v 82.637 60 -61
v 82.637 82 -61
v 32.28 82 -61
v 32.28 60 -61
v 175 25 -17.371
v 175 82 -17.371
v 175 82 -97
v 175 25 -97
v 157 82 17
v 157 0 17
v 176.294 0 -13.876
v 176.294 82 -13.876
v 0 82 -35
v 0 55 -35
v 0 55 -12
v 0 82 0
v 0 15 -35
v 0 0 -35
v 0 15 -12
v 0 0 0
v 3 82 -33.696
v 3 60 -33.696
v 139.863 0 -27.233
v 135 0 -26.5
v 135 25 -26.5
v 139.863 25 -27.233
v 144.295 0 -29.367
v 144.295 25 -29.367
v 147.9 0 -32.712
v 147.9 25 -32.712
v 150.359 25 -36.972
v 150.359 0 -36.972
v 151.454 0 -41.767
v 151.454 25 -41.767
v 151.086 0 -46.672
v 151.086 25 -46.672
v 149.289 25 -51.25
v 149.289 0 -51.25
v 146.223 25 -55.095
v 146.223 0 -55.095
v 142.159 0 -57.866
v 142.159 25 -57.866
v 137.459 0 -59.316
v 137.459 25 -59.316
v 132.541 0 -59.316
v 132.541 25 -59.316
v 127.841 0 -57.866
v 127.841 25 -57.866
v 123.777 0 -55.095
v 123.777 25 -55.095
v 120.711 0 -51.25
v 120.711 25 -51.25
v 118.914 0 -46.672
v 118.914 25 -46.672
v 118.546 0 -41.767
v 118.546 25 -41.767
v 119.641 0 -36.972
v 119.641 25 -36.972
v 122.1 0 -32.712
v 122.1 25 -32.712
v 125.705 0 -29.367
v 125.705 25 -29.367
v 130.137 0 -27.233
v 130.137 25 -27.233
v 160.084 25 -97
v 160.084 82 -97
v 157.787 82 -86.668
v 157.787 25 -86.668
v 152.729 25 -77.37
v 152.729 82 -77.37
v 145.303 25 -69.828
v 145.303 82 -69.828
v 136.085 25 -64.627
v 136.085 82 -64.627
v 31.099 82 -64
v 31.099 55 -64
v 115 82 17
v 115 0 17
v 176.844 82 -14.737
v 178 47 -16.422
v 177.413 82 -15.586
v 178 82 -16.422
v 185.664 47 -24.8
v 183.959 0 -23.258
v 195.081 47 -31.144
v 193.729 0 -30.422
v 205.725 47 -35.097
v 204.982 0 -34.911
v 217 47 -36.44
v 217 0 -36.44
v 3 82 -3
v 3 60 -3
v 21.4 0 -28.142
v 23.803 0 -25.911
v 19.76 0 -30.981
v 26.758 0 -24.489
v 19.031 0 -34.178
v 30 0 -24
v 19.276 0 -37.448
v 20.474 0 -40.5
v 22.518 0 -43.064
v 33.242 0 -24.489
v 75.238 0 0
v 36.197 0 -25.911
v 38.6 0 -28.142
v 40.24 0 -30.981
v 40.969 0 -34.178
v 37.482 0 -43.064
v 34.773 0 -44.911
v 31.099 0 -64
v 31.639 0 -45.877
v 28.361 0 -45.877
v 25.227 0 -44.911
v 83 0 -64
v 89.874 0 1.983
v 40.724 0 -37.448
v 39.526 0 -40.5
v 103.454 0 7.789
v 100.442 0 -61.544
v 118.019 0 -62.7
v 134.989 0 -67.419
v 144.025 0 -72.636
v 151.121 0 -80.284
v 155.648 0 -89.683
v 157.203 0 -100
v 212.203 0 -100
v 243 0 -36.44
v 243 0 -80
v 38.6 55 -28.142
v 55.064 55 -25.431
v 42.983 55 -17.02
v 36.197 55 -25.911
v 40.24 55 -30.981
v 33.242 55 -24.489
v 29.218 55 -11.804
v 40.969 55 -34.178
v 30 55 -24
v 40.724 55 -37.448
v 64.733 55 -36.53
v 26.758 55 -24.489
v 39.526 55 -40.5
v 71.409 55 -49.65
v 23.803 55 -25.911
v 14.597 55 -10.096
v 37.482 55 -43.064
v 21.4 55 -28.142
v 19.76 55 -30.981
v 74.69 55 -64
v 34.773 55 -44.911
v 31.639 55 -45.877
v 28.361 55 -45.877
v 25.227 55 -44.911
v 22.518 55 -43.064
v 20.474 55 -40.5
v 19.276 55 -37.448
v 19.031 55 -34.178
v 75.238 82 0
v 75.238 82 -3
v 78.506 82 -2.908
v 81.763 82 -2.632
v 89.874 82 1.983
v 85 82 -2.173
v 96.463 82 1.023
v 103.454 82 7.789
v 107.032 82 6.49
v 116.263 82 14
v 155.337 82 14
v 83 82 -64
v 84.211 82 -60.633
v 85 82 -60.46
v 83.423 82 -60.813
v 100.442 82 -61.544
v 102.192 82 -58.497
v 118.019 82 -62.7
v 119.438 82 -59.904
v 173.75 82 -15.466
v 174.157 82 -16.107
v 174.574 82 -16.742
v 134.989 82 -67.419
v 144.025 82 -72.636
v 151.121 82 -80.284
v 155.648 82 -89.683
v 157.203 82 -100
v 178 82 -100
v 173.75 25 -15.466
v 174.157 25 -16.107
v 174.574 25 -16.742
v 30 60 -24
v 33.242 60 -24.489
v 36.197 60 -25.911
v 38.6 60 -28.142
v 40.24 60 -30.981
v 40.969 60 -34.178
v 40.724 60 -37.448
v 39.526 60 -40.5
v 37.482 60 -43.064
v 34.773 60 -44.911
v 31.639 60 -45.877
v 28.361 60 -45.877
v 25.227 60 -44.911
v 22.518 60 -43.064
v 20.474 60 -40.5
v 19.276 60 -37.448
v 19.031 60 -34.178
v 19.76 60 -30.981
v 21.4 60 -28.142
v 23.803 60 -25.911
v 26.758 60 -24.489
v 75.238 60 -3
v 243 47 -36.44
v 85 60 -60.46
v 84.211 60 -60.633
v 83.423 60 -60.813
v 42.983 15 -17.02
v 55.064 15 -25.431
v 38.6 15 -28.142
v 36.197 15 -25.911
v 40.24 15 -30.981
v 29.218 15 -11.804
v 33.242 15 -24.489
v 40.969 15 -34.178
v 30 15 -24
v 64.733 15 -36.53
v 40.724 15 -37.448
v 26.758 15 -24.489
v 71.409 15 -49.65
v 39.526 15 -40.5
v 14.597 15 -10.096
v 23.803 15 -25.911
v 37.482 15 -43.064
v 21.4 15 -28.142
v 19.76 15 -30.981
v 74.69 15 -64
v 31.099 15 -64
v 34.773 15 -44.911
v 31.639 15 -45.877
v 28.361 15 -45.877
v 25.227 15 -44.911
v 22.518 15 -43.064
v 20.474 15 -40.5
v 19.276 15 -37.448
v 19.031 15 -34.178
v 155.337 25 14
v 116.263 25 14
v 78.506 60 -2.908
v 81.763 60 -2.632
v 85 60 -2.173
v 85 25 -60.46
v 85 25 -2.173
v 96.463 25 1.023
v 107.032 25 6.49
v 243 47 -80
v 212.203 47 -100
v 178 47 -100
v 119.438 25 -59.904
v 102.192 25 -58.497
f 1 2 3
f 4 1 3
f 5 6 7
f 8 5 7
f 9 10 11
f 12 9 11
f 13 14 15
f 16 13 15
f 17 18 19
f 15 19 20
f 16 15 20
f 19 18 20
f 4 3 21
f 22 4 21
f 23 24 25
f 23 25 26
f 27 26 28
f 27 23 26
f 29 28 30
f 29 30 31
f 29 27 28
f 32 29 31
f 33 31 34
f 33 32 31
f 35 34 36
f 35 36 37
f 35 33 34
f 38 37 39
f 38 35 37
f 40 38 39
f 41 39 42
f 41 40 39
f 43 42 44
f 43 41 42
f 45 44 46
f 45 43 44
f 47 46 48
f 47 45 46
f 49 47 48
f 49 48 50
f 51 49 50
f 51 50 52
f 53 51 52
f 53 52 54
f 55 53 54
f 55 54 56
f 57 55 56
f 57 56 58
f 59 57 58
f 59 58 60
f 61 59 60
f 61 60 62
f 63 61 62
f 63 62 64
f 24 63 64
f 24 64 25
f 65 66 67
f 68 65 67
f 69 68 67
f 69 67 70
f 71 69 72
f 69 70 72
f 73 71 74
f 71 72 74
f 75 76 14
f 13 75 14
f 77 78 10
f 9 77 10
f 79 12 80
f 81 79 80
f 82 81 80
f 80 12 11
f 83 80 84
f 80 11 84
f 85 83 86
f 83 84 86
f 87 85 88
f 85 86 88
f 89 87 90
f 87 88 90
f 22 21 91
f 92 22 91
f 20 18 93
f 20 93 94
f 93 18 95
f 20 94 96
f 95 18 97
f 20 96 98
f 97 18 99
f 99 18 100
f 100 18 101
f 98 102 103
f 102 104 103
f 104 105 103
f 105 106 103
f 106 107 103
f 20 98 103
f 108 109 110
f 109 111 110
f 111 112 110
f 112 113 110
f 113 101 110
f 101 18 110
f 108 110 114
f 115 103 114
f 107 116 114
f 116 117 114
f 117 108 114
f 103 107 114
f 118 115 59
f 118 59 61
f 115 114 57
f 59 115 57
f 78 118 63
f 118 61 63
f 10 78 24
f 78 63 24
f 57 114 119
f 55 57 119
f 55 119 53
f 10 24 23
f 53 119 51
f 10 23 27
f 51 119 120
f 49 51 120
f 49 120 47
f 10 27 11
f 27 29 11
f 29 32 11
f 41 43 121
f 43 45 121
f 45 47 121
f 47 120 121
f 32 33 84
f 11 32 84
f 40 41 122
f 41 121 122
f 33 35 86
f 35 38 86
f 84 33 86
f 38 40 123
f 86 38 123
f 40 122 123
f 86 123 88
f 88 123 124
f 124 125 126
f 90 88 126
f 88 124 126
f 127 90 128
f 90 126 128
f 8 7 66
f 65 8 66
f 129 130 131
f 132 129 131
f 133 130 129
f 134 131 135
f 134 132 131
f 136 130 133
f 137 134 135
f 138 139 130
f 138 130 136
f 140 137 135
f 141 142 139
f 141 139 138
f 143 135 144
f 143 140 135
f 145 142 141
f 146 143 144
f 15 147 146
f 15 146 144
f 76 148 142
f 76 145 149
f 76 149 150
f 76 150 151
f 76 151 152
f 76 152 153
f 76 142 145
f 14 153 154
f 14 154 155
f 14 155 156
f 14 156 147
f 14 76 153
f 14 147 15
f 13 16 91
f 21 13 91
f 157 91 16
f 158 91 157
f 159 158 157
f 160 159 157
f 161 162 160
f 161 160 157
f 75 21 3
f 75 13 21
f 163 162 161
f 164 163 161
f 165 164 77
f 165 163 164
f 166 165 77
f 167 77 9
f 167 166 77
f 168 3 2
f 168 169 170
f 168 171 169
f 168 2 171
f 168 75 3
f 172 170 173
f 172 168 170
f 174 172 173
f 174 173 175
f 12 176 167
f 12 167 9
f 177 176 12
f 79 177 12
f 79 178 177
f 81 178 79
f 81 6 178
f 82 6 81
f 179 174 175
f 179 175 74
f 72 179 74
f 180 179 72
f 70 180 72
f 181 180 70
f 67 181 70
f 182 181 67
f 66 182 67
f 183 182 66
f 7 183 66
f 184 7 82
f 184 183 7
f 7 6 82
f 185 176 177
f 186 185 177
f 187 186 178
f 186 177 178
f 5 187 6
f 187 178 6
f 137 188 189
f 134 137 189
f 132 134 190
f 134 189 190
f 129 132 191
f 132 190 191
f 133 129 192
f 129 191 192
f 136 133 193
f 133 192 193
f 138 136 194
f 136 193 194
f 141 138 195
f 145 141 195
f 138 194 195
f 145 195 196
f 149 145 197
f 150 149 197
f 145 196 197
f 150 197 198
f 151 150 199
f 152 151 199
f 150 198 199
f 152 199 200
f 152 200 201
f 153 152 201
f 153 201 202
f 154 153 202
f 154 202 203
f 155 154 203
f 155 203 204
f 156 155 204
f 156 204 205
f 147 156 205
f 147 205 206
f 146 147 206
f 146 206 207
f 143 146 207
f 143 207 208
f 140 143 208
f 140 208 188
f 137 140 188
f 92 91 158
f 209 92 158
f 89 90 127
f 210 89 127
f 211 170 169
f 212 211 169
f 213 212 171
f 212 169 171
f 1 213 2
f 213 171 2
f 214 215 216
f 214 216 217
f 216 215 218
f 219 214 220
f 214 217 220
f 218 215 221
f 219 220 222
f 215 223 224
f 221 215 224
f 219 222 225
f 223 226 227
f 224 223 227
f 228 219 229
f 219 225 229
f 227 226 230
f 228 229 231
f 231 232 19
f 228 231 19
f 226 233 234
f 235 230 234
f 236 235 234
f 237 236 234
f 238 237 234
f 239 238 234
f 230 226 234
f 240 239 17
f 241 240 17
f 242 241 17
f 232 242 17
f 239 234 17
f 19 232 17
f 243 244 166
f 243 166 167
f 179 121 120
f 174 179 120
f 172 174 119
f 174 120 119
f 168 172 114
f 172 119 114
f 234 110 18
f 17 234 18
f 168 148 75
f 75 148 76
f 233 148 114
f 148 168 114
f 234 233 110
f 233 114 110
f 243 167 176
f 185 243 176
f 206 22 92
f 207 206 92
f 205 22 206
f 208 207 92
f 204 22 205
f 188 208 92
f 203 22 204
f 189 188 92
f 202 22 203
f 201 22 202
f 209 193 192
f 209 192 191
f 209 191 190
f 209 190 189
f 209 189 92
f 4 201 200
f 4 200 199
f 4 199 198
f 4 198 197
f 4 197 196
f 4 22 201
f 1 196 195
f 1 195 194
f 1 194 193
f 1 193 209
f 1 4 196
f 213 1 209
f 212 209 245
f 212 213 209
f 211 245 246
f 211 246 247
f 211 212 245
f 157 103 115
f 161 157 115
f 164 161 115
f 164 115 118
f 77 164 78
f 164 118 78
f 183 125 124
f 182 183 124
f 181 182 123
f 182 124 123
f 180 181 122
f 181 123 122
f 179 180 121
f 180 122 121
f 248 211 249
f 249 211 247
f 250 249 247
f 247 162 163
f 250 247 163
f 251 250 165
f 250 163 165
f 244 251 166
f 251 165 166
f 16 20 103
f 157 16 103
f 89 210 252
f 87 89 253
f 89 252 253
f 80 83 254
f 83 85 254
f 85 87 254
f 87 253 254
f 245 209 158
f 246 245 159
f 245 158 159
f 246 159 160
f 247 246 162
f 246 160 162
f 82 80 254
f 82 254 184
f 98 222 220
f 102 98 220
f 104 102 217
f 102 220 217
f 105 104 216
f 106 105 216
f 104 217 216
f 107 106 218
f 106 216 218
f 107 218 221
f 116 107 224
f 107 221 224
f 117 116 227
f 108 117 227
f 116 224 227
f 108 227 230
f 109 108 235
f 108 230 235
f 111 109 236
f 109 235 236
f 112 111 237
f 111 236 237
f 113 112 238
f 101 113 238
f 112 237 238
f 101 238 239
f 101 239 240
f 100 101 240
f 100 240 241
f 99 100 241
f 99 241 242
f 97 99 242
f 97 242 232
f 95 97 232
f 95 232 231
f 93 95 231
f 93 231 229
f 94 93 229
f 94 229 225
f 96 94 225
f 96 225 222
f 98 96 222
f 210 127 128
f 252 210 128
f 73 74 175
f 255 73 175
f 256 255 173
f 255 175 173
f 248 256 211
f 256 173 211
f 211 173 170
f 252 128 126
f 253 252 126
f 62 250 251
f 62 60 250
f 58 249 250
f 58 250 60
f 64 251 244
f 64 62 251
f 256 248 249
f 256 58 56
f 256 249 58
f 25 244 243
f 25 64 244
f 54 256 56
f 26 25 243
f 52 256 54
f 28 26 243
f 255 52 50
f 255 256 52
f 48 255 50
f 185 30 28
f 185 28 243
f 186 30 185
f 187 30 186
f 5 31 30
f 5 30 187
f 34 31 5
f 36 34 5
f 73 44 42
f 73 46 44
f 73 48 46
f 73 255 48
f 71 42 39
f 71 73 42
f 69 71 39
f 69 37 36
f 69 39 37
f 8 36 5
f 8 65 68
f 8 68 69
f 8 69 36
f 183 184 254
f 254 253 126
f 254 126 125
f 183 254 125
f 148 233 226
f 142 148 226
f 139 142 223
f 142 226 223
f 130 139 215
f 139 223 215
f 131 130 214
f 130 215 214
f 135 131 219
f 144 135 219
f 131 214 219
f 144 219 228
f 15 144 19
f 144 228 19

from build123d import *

# Parameters (mm, degrees)
SKETCH1_R           = 16.5
BOSS_EXTRUDE1_DEPTH = 82
SKETCH2_R           = 11
CUT_EXTRUDE1_DEPTH  = 276.268959383
SKETCH5_W           = 65
SKETCH5_H           = 35
CUT_EXTRUDE2_DEPTH  = 282.890049487
CUT_EXTRUDE3_DEPTH  = 40
SKETCH9_R           = 11
CUT_EXTRUDE4_DEPTH  = 22
SKETCH10_R          = 16.5
CUT_EXTRUDE5_DEPTH  = 57


with BuildPart() as part:
    # Sketch1 → Boss-Extrude1 (new body)
    with BuildSketch(Plane(origin=(0, 0, 0), x_dir=(1, 0, 0), z_dir=(0, 1, 0))):
        with BuildLine():
            Line((212.202700724, 100), (157.202700724, 100))
            ThreePointArc((157.202700724, 100), (151.120923095, 80.283600356), (134.9891913, 67.419244043))
            ThreePointArc((134.9891913, 67.419244043), (109.260251558, 61.670356138), (83, 64))
            Line((83, 64), (31.098692591, 64))
            Line((31.098692591, 64), (0, 35))
            Line((0, 35), (0, 0))
            Line((0, 0), (75.238209296, 0))
            ThreePointArc((75.238209296, 0), (96.859957606, -4.428268766), (115, -17))
            Line((115, -17), (157, -17))
            Line((157, -17), (176.293691384, 13.876360515))
            ThreePointArc((176.293691384, 13.876360515), (193.729138228, 30.421981775), (217, 36.440235832))
            Line((217, 36.440235832), (243, 36.440235832))
            Line((243, 36.440235832), (243, 80))
            Line((243, 80), (212.202700724, 100))
        make_face()
        with Locations(Location((135, 43, 0), (0, 0, 270))):
            Circle(SKETCH1_R, mode=Mode.SUBTRACT)
    extrude(amount=BOSS_EXTRUDE1_DEPTH)

    # Sketch2 → Cut-Extrude1 (cut, through all)
    with BuildSketch(Plane(origin=(0, 82, 0), x_dir=(1, 0, 0), z_dir=(0, 1, 0))):
        with Locations(Location((30, 35, 0), (0, 0, 270))):
            Circle(SKETCH2_R)
    extrude(amount=-CUT_EXTRUDE1_DEPTH, mode=Mode.SUBTRACT)

    # Sketch5 → Cut-Extrude2 (cut, through all)
    with BuildSketch(Plane(origin=(0, 0, -100), x_dir=(-1, 0, 0), z_dir=(0, 0, -1))):
        with Locations((-210.5, 64.5)):
            Rectangle(SKETCH5_W, SKETCH5_H)
    extrude(amount=-CUT_EXTRUDE2_DEPTH, mode=Mode.SUBTRACT)

    # Sketch6 → Cut-Extrude3 (cut)
    with BuildSketch(Plane(origin=(0, 15, 0), x_dir=(-1, 0, 0), z_dir=(0, -1, 0))):
        with BuildLine():
            Line((0, 12), (0, 35))
            Line((0, 35), (-31.098692591, 64))
            Line((-31.098692591, 64), (-74.689647512, 64))
            ThreePointArc((-74.689647512, 64), (-49.282519579, 20.85341744), (0, 12))
        make_face()
    extrude(amount=-CUT_EXTRUDE3_DEPTH, mode=Mode.SUBTRACT)

    # Sketch9 → Cut-Extrude4 (cut)
    with BuildSketch(Plane(origin=(0, 82, 0), x_dir=(1, 0, 0), z_dir=(0, 1, 0))):
        with BuildLine():
            Line((85, 2.172610945), (85, 60.459646479))
            ThreePointArc((85, 60.459646479), (83.816874247, 60.721767227), (82.637433549, 61))
            Line((82.637433549, 61), (32.280424018, 61))
            Line((32.280424018, 61), (3, 33.695562875))
            Line((3, 33.695562875), (3, 3))
            Line((3, 3), (75.238209296, 3))
            ThreePointArc((75.238209296, 3), (80.136605217, 2.792782572), (85, 2.172610945))
        make_face()
        with Locations(Location((30, 35, 0), (0, 0, 90))):
            Circle(SKETCH9_R, mode=Mode.SUBTRACT)
    extrude(amount=-CUT_EXTRUDE4_DEPTH, mode=Mode.SUBTRACT)

    # Sketch10 → Cut-Extrude5 (cut)
    with BuildSketch(Plane(origin=(0, 82, 0), x_dir=(1, 0, 0), z_dir=(0, 1, 0))):
        with BuildLine():
            ThreePointArc((136.085176207, 64.626607818), (110.849591358, 58.779397637), (85, 60.459646479))
            Line((85, 60.459646479), (85, 2.172610945))
            ThreePointArc((85, 2.172610945), (101.887734543, -3.484926438), (116.262592289, -14))
            Line((116.262592289, -14), (155.337072846, -14))
            Line((155.337072846, -14), (173.749547096, 15.466118308))
            ThreePointArc((173.749547096, 15.466118308), (174.364131851, 16.425638226), (175, 17.371188115))
            Line((175, 17.371188115), (175, 97))
            Line((175, 97), (160.084094573, 97))
            ThreePointArc((160.084094573, 97), (152.729470491, 77.370012647), (136.085176207, 64.626607818))
        make_face()
        with Locations(Location((135, 43, 0), (0, 0, 270))):
            Circle(SKETCH10_R, mode=Mode.SUBTRACT)
    extrude(amount=-CUT_EXTRUDE5_DEPTH, mode=Mode.SUBTRACT)


solid = part.part
